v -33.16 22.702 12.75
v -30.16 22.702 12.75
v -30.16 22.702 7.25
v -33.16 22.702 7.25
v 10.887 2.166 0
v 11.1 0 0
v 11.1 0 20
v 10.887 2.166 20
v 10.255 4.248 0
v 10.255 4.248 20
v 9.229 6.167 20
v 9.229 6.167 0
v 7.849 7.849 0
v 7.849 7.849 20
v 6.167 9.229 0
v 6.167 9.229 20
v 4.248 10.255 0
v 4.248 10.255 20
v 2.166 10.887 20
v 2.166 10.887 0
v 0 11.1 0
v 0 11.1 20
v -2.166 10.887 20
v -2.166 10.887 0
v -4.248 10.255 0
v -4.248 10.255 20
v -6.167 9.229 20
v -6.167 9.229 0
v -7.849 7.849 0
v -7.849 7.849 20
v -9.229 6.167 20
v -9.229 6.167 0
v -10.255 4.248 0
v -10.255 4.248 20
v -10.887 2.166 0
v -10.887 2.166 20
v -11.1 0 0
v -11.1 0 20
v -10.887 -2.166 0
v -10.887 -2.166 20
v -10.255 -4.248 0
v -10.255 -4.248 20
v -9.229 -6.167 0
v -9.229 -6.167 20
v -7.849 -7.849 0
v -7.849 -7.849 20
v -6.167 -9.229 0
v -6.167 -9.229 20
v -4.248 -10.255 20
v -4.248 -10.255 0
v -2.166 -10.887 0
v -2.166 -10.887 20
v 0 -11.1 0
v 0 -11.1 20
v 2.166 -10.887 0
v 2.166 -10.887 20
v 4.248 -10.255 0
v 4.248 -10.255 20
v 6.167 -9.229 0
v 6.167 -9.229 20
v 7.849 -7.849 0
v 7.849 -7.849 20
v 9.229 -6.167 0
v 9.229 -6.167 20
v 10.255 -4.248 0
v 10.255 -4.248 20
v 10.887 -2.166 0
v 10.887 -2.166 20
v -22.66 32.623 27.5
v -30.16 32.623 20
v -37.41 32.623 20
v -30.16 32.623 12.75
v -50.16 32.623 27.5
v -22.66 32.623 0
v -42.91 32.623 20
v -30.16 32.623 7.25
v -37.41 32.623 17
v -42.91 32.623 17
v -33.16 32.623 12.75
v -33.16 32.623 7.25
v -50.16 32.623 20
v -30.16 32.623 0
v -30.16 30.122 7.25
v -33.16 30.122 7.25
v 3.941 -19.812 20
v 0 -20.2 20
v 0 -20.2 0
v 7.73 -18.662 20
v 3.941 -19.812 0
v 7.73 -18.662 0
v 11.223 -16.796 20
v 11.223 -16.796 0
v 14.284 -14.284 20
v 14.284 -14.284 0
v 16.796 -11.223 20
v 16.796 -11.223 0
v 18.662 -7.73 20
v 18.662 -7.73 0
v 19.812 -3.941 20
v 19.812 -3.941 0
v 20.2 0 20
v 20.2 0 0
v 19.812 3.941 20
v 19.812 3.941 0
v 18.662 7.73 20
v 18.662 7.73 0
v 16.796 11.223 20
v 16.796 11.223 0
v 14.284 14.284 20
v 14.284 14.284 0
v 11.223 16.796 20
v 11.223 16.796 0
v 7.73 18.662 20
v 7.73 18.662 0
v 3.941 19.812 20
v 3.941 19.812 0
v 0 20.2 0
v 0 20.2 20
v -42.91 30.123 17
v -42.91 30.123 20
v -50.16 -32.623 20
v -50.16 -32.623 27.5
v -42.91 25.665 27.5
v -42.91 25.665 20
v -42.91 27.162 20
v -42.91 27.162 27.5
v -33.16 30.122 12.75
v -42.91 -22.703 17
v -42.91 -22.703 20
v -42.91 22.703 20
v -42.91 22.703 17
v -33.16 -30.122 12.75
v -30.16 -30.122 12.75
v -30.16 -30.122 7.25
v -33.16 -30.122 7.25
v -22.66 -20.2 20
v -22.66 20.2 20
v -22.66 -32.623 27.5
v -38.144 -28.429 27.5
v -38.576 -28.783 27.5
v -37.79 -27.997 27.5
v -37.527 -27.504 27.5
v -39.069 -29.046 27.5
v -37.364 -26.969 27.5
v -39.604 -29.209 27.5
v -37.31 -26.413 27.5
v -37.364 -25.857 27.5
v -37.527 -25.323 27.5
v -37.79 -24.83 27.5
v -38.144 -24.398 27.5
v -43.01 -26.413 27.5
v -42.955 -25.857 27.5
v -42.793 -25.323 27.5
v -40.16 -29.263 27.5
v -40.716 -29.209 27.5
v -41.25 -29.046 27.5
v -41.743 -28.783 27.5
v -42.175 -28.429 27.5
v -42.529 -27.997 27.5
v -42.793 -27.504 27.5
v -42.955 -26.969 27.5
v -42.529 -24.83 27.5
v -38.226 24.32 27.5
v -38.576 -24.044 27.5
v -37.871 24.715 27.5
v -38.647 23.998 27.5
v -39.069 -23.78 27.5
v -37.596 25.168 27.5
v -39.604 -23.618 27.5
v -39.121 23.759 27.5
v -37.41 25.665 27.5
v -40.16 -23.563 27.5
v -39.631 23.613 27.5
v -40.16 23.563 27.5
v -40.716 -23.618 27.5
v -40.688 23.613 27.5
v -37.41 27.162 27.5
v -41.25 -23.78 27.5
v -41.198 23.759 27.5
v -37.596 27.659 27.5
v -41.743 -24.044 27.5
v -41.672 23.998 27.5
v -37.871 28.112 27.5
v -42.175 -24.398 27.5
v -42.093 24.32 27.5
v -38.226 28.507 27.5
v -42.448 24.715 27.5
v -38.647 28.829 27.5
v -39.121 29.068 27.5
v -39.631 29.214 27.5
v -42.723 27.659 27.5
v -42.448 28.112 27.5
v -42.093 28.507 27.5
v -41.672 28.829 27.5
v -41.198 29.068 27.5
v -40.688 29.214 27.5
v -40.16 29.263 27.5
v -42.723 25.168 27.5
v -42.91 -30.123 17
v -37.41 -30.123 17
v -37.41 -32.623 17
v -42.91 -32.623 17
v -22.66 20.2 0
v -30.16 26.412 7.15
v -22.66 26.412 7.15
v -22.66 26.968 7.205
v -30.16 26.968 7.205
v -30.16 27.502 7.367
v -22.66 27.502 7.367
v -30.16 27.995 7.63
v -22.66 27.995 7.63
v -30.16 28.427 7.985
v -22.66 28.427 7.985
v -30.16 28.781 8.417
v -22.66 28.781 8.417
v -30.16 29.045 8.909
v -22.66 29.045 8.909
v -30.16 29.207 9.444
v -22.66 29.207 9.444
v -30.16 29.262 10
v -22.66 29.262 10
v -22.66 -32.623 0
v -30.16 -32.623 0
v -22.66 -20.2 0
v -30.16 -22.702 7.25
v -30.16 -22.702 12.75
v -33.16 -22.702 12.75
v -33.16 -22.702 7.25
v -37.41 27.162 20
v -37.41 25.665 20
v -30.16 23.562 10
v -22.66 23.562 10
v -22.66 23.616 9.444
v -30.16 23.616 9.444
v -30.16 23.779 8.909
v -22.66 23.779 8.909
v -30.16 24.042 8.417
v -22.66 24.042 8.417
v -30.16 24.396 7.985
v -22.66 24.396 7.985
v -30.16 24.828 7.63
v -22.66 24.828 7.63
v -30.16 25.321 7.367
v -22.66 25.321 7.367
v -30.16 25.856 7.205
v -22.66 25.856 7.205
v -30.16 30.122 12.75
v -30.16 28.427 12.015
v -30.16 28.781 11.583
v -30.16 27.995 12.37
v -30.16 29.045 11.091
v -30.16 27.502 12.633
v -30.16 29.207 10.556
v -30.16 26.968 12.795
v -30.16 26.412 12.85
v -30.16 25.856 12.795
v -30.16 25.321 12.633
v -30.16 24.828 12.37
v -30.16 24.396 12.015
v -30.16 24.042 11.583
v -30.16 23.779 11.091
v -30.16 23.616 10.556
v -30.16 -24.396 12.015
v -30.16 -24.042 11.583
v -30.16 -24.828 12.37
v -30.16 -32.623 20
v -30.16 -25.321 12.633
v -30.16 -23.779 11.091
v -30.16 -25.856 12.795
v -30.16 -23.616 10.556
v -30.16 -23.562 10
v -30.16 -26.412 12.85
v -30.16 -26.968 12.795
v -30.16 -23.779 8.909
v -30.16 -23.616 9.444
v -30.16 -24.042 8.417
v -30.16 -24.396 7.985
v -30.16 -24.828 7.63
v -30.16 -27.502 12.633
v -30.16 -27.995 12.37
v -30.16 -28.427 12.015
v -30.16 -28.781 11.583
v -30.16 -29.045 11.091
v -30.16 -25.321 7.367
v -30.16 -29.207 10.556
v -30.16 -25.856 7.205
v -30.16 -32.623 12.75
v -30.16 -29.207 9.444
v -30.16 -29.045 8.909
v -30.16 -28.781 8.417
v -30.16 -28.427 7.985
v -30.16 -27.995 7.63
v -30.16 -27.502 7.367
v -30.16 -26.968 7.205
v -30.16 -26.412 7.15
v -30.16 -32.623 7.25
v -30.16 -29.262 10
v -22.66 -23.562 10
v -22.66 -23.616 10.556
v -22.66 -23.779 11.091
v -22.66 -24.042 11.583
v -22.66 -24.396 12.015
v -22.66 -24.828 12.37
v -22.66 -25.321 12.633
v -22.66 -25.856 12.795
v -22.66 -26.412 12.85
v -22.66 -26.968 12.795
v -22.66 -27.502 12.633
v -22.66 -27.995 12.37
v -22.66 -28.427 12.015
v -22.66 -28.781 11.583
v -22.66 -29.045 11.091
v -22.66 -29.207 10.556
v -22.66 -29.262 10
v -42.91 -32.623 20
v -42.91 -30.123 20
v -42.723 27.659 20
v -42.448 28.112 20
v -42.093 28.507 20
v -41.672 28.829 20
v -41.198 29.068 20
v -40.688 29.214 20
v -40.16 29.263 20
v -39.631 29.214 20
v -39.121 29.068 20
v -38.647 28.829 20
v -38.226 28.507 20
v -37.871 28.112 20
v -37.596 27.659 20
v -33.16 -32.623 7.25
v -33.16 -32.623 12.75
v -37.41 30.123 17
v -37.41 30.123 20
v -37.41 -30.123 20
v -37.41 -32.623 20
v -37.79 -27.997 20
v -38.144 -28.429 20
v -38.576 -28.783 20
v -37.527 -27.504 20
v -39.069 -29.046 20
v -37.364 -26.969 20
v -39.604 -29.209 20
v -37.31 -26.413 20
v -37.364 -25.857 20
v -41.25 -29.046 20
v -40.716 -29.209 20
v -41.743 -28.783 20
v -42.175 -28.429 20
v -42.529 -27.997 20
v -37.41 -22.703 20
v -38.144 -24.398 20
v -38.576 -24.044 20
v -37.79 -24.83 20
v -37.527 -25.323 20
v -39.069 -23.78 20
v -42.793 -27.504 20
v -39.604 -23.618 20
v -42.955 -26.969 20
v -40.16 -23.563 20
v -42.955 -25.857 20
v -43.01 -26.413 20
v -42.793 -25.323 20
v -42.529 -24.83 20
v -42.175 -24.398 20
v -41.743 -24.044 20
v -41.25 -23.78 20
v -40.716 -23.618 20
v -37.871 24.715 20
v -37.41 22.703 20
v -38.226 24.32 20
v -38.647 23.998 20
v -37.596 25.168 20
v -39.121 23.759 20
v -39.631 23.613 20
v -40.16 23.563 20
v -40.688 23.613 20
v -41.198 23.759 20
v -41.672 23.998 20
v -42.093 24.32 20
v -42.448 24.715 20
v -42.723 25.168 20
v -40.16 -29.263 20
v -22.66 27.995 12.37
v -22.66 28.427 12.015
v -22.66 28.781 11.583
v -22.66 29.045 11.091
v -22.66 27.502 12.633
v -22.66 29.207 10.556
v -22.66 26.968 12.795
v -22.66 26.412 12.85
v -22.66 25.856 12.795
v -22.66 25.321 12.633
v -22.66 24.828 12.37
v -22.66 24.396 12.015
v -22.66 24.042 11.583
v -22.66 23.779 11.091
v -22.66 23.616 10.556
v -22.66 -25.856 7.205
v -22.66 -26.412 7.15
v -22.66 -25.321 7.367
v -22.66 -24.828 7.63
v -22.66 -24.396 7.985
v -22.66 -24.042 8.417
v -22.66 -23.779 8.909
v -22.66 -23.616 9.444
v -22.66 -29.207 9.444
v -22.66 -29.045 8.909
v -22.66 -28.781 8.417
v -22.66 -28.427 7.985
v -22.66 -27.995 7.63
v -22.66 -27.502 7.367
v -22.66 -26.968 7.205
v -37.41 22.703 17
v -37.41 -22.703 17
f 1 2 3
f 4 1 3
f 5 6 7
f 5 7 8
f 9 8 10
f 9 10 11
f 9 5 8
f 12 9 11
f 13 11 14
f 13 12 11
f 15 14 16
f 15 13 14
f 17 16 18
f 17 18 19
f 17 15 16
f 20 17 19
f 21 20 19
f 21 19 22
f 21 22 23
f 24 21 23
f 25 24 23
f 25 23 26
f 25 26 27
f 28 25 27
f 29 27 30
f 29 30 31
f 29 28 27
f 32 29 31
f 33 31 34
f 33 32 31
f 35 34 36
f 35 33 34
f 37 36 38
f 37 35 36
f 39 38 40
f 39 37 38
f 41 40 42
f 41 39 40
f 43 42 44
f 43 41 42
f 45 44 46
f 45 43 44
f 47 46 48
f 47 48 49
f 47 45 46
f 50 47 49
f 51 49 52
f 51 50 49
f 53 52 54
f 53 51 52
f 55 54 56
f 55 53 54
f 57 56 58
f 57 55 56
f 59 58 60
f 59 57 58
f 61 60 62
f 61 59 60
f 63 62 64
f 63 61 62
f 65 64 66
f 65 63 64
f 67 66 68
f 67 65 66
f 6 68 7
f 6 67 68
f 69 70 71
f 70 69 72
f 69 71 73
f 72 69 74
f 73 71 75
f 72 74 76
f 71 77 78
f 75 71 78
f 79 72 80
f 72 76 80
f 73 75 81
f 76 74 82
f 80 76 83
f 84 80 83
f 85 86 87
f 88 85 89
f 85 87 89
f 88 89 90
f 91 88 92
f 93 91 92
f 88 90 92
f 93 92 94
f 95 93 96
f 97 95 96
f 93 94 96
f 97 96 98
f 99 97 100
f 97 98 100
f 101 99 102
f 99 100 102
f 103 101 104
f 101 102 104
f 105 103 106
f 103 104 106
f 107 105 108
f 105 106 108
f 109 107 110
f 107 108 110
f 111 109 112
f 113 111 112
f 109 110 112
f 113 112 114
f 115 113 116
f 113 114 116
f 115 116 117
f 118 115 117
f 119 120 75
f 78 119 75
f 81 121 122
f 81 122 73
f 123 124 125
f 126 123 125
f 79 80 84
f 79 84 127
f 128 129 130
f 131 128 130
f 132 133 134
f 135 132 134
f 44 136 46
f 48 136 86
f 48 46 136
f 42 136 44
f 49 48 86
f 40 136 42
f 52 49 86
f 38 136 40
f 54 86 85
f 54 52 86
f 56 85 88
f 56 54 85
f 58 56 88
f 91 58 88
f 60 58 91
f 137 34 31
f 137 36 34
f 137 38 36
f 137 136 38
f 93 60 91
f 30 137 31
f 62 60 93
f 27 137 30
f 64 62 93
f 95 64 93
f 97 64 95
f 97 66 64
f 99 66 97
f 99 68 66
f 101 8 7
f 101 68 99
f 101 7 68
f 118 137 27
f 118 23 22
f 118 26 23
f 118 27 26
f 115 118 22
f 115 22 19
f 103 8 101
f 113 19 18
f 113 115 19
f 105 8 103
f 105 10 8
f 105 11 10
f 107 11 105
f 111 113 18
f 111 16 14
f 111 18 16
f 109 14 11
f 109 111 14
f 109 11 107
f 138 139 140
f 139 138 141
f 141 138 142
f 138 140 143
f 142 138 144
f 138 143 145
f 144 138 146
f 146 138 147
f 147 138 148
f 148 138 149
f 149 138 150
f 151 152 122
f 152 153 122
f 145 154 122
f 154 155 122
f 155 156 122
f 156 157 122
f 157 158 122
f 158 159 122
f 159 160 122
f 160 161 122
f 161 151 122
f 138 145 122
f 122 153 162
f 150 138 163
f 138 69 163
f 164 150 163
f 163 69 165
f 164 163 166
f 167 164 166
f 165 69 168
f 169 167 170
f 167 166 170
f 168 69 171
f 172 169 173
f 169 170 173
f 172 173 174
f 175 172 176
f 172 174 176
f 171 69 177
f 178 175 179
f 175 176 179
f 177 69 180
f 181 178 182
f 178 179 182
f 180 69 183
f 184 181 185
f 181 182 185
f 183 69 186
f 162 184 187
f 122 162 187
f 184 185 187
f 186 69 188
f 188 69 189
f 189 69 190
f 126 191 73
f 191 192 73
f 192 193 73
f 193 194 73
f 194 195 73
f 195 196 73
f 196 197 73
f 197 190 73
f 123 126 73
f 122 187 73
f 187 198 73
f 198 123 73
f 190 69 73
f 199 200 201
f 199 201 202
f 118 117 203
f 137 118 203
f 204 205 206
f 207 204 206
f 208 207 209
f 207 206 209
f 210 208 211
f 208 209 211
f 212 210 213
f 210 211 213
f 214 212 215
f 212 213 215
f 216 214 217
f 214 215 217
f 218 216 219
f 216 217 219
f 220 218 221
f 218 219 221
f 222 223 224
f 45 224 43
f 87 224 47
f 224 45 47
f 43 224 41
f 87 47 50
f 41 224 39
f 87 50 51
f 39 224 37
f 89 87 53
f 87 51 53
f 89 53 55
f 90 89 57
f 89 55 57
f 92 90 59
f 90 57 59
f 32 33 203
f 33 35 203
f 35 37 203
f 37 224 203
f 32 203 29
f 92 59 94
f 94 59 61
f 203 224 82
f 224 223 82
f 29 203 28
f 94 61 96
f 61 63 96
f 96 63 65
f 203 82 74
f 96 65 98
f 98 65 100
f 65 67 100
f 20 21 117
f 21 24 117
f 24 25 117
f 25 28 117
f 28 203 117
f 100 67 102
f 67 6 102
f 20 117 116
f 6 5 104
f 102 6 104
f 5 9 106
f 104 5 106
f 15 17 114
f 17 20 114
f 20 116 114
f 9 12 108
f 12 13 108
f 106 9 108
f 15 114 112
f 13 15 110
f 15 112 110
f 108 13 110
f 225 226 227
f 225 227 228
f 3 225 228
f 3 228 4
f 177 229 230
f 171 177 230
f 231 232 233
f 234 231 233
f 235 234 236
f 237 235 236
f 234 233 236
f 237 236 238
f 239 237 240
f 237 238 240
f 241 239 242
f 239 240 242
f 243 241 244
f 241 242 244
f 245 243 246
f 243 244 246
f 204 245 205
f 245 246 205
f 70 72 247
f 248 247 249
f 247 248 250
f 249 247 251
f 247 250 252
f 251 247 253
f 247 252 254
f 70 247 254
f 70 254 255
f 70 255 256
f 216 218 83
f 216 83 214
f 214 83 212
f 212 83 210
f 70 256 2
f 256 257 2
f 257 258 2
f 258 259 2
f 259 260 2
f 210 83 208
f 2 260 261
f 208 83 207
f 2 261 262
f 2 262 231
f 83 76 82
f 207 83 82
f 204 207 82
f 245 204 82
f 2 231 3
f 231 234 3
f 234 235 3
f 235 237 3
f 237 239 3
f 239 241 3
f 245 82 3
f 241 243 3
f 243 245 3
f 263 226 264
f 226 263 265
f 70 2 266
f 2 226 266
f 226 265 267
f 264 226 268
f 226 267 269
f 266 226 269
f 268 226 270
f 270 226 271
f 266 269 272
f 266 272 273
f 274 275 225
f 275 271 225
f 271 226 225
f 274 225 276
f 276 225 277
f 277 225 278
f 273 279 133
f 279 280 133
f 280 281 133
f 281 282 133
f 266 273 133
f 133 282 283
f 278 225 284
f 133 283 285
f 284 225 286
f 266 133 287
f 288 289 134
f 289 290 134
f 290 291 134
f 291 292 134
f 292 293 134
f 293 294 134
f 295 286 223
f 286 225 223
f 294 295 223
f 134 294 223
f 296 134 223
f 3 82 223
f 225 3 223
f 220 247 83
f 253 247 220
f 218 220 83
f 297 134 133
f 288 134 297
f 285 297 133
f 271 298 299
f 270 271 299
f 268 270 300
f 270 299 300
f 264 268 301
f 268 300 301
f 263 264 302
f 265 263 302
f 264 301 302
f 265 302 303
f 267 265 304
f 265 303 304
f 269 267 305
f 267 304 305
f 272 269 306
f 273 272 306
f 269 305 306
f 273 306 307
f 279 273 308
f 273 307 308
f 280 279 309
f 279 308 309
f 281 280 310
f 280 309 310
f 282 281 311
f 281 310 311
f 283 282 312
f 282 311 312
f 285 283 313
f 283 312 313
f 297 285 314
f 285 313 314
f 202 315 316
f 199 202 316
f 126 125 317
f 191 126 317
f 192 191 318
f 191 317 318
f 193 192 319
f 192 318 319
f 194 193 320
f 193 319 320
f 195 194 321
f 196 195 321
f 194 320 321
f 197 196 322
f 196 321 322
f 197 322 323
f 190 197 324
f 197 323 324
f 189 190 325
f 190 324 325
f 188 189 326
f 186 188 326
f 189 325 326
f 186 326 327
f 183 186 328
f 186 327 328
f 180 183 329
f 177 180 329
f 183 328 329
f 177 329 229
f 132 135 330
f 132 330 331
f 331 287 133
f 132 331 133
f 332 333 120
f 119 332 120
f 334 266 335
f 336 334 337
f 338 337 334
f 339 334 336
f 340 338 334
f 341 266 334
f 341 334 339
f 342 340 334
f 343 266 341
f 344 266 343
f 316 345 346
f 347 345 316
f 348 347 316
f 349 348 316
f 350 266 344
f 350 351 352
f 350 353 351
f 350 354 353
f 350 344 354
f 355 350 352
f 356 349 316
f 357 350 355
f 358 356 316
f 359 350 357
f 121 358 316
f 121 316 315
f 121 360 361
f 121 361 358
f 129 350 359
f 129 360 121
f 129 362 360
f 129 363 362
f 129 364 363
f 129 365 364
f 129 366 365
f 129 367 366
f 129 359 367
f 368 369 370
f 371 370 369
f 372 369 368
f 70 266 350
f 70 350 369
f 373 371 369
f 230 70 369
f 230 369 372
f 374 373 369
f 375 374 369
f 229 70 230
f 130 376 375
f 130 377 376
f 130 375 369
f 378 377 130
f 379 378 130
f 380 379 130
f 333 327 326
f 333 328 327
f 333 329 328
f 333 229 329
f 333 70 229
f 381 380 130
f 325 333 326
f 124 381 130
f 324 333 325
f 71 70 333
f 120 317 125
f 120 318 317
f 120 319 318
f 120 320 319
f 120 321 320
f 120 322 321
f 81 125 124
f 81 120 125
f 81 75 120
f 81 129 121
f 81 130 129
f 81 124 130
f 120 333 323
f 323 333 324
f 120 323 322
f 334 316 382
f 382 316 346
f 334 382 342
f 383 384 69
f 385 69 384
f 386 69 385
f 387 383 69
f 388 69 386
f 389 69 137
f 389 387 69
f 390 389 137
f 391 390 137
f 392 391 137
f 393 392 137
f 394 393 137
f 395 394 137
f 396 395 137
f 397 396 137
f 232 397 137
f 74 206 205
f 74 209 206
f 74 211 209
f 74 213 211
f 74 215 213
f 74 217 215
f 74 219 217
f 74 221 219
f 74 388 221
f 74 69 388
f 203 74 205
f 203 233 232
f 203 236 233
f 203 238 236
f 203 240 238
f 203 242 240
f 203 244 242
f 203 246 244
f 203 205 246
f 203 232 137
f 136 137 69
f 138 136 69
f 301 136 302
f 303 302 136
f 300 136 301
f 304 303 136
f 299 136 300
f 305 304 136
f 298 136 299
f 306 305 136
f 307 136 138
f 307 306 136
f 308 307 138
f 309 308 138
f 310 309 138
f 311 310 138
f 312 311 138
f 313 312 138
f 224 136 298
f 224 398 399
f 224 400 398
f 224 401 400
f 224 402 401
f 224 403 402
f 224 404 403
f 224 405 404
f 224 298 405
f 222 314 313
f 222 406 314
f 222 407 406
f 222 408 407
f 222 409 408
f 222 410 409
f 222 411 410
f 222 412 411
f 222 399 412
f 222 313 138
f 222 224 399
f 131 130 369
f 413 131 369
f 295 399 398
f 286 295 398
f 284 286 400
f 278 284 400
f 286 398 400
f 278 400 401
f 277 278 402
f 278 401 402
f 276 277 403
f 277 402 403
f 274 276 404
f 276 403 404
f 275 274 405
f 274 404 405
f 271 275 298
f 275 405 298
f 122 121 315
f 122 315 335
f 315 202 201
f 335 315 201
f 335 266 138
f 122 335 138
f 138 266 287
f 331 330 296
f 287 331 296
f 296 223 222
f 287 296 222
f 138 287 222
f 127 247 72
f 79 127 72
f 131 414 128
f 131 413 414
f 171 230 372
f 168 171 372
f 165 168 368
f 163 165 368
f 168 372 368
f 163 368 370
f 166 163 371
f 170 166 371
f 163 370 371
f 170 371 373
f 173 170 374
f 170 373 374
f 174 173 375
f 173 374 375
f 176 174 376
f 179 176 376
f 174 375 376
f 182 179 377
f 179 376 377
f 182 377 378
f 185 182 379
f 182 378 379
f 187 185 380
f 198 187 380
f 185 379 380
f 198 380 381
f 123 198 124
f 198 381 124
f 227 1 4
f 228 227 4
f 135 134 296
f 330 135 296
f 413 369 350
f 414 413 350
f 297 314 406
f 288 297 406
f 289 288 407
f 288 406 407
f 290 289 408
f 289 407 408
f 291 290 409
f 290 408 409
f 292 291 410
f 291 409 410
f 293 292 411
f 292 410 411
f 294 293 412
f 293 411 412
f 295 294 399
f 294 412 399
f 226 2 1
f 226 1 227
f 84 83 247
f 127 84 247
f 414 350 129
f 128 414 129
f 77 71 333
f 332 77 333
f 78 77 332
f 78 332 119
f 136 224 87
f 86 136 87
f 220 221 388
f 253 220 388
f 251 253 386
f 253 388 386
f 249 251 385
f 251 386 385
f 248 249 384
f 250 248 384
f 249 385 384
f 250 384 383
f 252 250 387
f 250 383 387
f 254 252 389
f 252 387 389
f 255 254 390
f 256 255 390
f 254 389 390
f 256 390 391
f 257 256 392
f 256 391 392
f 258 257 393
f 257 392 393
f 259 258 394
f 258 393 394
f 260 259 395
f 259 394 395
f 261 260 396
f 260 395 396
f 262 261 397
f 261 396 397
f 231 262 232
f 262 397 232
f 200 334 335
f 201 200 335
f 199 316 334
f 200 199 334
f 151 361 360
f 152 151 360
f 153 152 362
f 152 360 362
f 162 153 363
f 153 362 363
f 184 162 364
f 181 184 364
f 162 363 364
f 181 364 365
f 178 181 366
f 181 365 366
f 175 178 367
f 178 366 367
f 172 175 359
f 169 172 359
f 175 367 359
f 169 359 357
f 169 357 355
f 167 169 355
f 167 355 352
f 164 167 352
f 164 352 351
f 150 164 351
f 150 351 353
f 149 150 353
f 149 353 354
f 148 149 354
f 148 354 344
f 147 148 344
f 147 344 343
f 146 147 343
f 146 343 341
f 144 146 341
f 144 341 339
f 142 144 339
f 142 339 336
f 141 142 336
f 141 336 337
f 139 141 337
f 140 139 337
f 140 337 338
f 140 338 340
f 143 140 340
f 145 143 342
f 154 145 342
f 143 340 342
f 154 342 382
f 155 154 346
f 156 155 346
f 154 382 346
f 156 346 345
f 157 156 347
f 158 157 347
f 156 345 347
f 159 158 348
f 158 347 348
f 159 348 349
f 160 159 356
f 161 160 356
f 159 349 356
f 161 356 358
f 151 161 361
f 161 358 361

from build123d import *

# Parameters (mm, degrees)
SKETCH_2_R          = 11.1
EXTRUDE_4_DEPTH     = 20
CUT_EXTRUDE_1_DEPTH = 10
EXTRUDE_5_DEPTH     = 3
EXTRUDE_6_DEPTH     = 7.5
SKETCH_19_R         = 2.85
CUT_EXTRUDE_2_DEPTH = 10
EXTRUDE_7_DEPTH     = 3


with BuildPart() as part:
    # Эскиз2 → Бобышка-Вытянуть4 (new body)
    with BuildSketch(Plane.XY):
        with BuildLine():
            Line((0, 20.2), (-22.659630228, 20.2))
            Line((-22.659630228, 20.2), (-22.659630228, 32.623416793))
            Line((-22.659630228, 32.623416793), (-30.159630228, 32.623416793))
            Line((-30.159630228, 32.623416793), (-30.159630228, -32.623416793))
            Line((-30.159630228, -32.623416793), (-22.659630228, -32.623416793))
            Line((-22.659630228, -32.623416793), (-22.659630228, -20.2))
            Line((-22.659630228, -20.2), (0, -20.2))
            ThreePointArc((0, -20.2), (20.2, 0), (0, 20.2))
        make_face()
        Circle(SKETCH_2_R, mode=Mode.SUBTRACT)
    extrude(amount=EXTRUDE_4_DEPTH)

    # Эскиз8 → Вырез-Вытянуть1 (cut)
    with BuildSketch(Plane(origin=(-22.659630228, 0, 0), x_dir=(0, 0, -1), z_dir=(1, 0, 0))):
        with BuildLine():
            ThreePointArc((-10, -23.561708397), (-12.85, -26.411708397), (-10, -29.261708397))
            Line((-10, -29.261708397), (-10, -23.561708397))
        make_face()
        with BuildLine():
            Line((-10, -23.561708397), (-10, -29.261708397))
            ThreePointArc((-10, -29.261708397), (-7.984745674, -28.426962723), (-7.15, -26.411708397))
            ThreePointArc((-7.15, -26.411708397), (-7.984745674, -24.39645407), (-10, -23.561708397))
        make_face()
        with BuildLine():
            ThreePointArc((-7.15, 26.411708397), (-7.984745674, 28.426962723), (-10, 29.261708397))
            Line((-10, 29.261708397), (-10, 23.561708397))
            ThreePointArc((-10, 23.561708397), (-7.984745674, 24.39645407), (-7.15, 26.411708397))
        make_face()
        with BuildLine():
            Line((-10, 23.561708397), (-10, 29.261708397))
            ThreePointArc((-10, 29.261708397), (-12.85, 26.411708397), (-10, 23.561708397))
        make_face()
    extrude(amount=-CUT_EXTRUDE_1_DEPTH, mode=Mode.SUBTRACT)

    # Эскиз15 → Бобышка-Вытянуть5 (add)
    with BuildSketch(Plane.ZY.offset(30.159630228)):
        Polygon((7.25, 22.701708397), (10, 22.701708397), (12.75, 22.701708397), (12.75, -22.701708397), (7.25, -22.701708397), align=None)
        Polygon((7.25, 32.623416793), (7.25, 30.121708397), (10, 30.121708397), (12.75, 30.121708397), (12.75, 32.623416793), align=None)
        Polygon((10, -30.121708397), (7.756029521, -30.121708397), (7.25, -30.121708397), (7.25, -32.623416793), (12.75, -32.623416793), (12.75, -30.121708397), align=None)
    extrude(amount=EXTRUDE_5_DEPTH)

    # Эскиз18 → Бобышка-Вытянуть6 (add)
    with BuildSketch(Plane.XY.offset(20)):
        Polygon((-30.159630228, -32.623416793), (-50.159630228, -32.623416793), (-50.159630228, 32.623416793), (-30.159630228, 32.623416793), (-22.659630228, 32.623416793), (-22.659630228, -32.623416793), align=None)
    extrude(amount=EXTRUDE_6_DEPTH)

    # Эскиз19 → Вырез-Вытянуть2 (cut)
    with BuildSketch(Plane(origin=(0, 0, 20), x_dir=(-1, 0, 0), z_dir=(0, 0, -1))):
        with Locations((40.159630228, -26.413416793)):
            Circle(SKETCH_19_R)
        with BuildLine():
            Line((37.409630228, 27.161748271), (37.409630228, 25.665085316))
            ThreePointArc((37.409630228, 25.665085316), (40.159630228, 23.563416793), (42.909630228, 25.665085316))
            Line((42.909630228, 25.665085316), (42.909630228, 27.161748271))
            ThreePointArc((42.909630228, 27.161748271), (40.159630228, 29.263416793), (37.409630228, 27.161748271))
        make_face()
    extrude(amount=-CUT_EXTRUDE_2_DEPTH, mode=Mode.SUBTRACT)

    # Эскиз19<14> → Бобышка-Вытянуть7 (add)
    with BuildSketch(Plane(origin=(0, 0, 20), x_dir=(-1, 0, 0), z_dir=(0, 0, -1))):
        Polygon((37.409630228, -22.703416793), (40.159630228, -22.703416793), (42.909630228, -22.703416793), (42.909630228, 22.703416793), (40.159630228, 22.703416793), (37.409630228, 22.703416793), align=None)
        Polygon((37.409630228, 32.623416793), (37.409630228, 30.123416793), (40.159630228, 30.123416793), (42.909630228, 30.123416793), (42.909630228, 32.623416793), align=None)
        Polygon((42.909630228, -30.123416793), (40.159630228, -30.123416793), (37.409630228, -30.123416793), (37.409630228, -32.623416793), (42.909630228, -32.623416793), align=None)
    extrude(amount=EXTRUDE_7_DEPTH)


solid = part.part
